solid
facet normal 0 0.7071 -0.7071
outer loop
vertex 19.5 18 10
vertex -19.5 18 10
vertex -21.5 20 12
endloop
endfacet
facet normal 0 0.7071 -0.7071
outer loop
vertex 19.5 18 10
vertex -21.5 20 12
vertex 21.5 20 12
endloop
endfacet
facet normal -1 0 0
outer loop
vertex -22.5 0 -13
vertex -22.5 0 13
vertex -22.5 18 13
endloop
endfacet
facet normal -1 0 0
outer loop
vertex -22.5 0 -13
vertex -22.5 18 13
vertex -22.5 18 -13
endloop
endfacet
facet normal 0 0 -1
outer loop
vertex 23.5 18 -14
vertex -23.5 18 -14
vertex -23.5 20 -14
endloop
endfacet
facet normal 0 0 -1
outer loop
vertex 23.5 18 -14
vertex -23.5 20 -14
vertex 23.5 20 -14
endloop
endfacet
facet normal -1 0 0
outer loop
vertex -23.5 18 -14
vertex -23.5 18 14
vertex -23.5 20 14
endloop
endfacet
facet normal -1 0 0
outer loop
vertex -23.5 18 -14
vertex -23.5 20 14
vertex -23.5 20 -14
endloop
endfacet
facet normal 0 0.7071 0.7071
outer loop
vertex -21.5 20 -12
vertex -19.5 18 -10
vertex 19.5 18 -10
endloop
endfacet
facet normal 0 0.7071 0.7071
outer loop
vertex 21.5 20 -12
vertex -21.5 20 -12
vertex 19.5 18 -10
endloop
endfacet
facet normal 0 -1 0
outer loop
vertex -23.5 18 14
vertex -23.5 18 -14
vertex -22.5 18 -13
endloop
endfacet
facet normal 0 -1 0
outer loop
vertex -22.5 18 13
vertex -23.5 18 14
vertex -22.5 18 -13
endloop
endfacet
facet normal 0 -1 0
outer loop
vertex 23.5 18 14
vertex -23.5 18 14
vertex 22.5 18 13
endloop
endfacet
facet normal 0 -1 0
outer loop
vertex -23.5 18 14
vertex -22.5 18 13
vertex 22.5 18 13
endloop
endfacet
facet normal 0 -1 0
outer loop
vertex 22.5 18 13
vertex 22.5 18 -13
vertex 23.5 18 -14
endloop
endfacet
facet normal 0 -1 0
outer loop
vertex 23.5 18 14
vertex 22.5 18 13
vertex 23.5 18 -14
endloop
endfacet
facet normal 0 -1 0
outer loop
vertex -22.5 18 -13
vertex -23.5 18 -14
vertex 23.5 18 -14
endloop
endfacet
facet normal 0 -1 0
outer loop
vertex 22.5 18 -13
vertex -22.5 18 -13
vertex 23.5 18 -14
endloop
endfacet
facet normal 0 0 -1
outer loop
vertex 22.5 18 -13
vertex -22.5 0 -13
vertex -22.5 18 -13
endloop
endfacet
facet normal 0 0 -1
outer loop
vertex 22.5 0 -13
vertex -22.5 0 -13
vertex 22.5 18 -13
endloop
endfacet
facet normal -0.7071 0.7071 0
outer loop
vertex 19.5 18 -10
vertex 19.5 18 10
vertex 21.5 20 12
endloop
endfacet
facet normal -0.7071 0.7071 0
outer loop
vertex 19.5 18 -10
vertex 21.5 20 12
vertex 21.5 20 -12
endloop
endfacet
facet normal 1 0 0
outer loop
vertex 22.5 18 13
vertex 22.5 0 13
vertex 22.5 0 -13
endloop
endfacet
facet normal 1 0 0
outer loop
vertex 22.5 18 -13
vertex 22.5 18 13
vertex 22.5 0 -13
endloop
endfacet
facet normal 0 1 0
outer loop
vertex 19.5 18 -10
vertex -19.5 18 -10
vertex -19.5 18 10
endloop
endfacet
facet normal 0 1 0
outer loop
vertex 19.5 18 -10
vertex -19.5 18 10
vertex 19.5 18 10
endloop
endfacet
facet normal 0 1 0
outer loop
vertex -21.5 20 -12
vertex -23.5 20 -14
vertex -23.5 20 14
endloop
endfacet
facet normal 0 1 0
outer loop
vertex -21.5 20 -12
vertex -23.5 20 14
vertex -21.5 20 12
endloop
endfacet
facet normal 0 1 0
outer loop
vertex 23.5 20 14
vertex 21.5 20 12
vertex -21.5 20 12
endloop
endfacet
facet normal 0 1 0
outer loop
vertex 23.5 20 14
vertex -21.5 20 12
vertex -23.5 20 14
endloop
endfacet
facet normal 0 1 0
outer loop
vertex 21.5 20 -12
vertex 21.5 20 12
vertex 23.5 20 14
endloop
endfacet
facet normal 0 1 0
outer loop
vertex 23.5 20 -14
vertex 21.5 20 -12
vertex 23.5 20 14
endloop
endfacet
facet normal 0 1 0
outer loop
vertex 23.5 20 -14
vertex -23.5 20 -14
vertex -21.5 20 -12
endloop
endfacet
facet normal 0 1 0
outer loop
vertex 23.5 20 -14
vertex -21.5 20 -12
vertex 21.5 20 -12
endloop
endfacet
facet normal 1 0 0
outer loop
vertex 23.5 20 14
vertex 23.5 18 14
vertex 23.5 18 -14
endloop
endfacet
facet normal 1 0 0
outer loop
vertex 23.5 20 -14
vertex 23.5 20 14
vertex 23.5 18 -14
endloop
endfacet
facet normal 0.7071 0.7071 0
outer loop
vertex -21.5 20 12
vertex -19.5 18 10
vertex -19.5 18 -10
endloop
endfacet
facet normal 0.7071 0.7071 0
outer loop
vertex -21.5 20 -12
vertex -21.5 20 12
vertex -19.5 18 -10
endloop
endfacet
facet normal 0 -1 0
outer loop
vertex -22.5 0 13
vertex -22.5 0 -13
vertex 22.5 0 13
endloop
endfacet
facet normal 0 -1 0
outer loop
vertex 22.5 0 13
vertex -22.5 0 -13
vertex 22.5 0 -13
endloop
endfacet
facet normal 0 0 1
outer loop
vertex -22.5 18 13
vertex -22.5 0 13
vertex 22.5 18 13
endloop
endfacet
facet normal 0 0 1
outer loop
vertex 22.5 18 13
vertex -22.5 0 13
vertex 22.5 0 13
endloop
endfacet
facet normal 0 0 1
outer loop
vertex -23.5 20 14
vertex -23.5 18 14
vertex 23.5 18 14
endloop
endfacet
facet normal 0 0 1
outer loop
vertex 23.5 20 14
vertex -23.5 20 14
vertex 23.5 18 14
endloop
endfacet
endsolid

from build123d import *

# Parameters (mm, degrees)
SKETCH_1_W          = 45
SKETCH_1_H          = 26
EXTRUDE_1_DEPTH     = 18
SKETCH_2_W          = 47
SKETCH_2_H          = 28
EXTRUDE_2_DEPTH     = 2
SKETCH_3_W          = 39
SKETCH_3_H          = 20
CUT_EXTRUDE_2_DEPTH = 2
CHAMFER_1_SIZE      = 2


with BuildPart() as part:
    # 草图1 → 凸台-拉伸1 (new body)
    with BuildSketch(Plane(origin=(0, 0, 0), x_dir=(1, 0, 0), z_dir=(0, 1, 0))):
        Rectangle(SKETCH_1_W, SKETCH_1_H)
    extrude(amount=EXTRUDE_1_DEPTH)

    # 草图2 → 凸台-拉伸2 (add)
    with BuildSketch(Plane(origin=(0, 18, 0), x_dir=(1, 0, 0), z_dir=(0, 1, 0))):
        Rectangle(SKETCH_2_W, SKETCH_2_H)
    extrude(amount=EXTRUDE_2_DEPTH)

    # 草图3 → 切除-拉伸2 (cut)
    with BuildSketch(Plane(origin=(0, 20, 0), x_dir=(1, 0, 0), z_dir=(0, 1, 0))):
        Rectangle(SKETCH_3_W, SKETCH_3_H)
    extrude(amount=-CUT_EXTRUDE_2_DEPTH, mode=Mode.SUBTRACT)

    # 倒角1
    chamfer_1_edges = [part.edges().sort_by_distance(p)[0] for p in [
        (-19.5, 20, 0),
        (0, 20, 10),
        (19.5, 20, 0),
        (0, 20, -10),
    ]]
    chamfer(chamfer_1_edges, length=CHAMFER_1_SIZE - 0.0001)  # a hair under: the kernel refuses the full size


solid = part.part
